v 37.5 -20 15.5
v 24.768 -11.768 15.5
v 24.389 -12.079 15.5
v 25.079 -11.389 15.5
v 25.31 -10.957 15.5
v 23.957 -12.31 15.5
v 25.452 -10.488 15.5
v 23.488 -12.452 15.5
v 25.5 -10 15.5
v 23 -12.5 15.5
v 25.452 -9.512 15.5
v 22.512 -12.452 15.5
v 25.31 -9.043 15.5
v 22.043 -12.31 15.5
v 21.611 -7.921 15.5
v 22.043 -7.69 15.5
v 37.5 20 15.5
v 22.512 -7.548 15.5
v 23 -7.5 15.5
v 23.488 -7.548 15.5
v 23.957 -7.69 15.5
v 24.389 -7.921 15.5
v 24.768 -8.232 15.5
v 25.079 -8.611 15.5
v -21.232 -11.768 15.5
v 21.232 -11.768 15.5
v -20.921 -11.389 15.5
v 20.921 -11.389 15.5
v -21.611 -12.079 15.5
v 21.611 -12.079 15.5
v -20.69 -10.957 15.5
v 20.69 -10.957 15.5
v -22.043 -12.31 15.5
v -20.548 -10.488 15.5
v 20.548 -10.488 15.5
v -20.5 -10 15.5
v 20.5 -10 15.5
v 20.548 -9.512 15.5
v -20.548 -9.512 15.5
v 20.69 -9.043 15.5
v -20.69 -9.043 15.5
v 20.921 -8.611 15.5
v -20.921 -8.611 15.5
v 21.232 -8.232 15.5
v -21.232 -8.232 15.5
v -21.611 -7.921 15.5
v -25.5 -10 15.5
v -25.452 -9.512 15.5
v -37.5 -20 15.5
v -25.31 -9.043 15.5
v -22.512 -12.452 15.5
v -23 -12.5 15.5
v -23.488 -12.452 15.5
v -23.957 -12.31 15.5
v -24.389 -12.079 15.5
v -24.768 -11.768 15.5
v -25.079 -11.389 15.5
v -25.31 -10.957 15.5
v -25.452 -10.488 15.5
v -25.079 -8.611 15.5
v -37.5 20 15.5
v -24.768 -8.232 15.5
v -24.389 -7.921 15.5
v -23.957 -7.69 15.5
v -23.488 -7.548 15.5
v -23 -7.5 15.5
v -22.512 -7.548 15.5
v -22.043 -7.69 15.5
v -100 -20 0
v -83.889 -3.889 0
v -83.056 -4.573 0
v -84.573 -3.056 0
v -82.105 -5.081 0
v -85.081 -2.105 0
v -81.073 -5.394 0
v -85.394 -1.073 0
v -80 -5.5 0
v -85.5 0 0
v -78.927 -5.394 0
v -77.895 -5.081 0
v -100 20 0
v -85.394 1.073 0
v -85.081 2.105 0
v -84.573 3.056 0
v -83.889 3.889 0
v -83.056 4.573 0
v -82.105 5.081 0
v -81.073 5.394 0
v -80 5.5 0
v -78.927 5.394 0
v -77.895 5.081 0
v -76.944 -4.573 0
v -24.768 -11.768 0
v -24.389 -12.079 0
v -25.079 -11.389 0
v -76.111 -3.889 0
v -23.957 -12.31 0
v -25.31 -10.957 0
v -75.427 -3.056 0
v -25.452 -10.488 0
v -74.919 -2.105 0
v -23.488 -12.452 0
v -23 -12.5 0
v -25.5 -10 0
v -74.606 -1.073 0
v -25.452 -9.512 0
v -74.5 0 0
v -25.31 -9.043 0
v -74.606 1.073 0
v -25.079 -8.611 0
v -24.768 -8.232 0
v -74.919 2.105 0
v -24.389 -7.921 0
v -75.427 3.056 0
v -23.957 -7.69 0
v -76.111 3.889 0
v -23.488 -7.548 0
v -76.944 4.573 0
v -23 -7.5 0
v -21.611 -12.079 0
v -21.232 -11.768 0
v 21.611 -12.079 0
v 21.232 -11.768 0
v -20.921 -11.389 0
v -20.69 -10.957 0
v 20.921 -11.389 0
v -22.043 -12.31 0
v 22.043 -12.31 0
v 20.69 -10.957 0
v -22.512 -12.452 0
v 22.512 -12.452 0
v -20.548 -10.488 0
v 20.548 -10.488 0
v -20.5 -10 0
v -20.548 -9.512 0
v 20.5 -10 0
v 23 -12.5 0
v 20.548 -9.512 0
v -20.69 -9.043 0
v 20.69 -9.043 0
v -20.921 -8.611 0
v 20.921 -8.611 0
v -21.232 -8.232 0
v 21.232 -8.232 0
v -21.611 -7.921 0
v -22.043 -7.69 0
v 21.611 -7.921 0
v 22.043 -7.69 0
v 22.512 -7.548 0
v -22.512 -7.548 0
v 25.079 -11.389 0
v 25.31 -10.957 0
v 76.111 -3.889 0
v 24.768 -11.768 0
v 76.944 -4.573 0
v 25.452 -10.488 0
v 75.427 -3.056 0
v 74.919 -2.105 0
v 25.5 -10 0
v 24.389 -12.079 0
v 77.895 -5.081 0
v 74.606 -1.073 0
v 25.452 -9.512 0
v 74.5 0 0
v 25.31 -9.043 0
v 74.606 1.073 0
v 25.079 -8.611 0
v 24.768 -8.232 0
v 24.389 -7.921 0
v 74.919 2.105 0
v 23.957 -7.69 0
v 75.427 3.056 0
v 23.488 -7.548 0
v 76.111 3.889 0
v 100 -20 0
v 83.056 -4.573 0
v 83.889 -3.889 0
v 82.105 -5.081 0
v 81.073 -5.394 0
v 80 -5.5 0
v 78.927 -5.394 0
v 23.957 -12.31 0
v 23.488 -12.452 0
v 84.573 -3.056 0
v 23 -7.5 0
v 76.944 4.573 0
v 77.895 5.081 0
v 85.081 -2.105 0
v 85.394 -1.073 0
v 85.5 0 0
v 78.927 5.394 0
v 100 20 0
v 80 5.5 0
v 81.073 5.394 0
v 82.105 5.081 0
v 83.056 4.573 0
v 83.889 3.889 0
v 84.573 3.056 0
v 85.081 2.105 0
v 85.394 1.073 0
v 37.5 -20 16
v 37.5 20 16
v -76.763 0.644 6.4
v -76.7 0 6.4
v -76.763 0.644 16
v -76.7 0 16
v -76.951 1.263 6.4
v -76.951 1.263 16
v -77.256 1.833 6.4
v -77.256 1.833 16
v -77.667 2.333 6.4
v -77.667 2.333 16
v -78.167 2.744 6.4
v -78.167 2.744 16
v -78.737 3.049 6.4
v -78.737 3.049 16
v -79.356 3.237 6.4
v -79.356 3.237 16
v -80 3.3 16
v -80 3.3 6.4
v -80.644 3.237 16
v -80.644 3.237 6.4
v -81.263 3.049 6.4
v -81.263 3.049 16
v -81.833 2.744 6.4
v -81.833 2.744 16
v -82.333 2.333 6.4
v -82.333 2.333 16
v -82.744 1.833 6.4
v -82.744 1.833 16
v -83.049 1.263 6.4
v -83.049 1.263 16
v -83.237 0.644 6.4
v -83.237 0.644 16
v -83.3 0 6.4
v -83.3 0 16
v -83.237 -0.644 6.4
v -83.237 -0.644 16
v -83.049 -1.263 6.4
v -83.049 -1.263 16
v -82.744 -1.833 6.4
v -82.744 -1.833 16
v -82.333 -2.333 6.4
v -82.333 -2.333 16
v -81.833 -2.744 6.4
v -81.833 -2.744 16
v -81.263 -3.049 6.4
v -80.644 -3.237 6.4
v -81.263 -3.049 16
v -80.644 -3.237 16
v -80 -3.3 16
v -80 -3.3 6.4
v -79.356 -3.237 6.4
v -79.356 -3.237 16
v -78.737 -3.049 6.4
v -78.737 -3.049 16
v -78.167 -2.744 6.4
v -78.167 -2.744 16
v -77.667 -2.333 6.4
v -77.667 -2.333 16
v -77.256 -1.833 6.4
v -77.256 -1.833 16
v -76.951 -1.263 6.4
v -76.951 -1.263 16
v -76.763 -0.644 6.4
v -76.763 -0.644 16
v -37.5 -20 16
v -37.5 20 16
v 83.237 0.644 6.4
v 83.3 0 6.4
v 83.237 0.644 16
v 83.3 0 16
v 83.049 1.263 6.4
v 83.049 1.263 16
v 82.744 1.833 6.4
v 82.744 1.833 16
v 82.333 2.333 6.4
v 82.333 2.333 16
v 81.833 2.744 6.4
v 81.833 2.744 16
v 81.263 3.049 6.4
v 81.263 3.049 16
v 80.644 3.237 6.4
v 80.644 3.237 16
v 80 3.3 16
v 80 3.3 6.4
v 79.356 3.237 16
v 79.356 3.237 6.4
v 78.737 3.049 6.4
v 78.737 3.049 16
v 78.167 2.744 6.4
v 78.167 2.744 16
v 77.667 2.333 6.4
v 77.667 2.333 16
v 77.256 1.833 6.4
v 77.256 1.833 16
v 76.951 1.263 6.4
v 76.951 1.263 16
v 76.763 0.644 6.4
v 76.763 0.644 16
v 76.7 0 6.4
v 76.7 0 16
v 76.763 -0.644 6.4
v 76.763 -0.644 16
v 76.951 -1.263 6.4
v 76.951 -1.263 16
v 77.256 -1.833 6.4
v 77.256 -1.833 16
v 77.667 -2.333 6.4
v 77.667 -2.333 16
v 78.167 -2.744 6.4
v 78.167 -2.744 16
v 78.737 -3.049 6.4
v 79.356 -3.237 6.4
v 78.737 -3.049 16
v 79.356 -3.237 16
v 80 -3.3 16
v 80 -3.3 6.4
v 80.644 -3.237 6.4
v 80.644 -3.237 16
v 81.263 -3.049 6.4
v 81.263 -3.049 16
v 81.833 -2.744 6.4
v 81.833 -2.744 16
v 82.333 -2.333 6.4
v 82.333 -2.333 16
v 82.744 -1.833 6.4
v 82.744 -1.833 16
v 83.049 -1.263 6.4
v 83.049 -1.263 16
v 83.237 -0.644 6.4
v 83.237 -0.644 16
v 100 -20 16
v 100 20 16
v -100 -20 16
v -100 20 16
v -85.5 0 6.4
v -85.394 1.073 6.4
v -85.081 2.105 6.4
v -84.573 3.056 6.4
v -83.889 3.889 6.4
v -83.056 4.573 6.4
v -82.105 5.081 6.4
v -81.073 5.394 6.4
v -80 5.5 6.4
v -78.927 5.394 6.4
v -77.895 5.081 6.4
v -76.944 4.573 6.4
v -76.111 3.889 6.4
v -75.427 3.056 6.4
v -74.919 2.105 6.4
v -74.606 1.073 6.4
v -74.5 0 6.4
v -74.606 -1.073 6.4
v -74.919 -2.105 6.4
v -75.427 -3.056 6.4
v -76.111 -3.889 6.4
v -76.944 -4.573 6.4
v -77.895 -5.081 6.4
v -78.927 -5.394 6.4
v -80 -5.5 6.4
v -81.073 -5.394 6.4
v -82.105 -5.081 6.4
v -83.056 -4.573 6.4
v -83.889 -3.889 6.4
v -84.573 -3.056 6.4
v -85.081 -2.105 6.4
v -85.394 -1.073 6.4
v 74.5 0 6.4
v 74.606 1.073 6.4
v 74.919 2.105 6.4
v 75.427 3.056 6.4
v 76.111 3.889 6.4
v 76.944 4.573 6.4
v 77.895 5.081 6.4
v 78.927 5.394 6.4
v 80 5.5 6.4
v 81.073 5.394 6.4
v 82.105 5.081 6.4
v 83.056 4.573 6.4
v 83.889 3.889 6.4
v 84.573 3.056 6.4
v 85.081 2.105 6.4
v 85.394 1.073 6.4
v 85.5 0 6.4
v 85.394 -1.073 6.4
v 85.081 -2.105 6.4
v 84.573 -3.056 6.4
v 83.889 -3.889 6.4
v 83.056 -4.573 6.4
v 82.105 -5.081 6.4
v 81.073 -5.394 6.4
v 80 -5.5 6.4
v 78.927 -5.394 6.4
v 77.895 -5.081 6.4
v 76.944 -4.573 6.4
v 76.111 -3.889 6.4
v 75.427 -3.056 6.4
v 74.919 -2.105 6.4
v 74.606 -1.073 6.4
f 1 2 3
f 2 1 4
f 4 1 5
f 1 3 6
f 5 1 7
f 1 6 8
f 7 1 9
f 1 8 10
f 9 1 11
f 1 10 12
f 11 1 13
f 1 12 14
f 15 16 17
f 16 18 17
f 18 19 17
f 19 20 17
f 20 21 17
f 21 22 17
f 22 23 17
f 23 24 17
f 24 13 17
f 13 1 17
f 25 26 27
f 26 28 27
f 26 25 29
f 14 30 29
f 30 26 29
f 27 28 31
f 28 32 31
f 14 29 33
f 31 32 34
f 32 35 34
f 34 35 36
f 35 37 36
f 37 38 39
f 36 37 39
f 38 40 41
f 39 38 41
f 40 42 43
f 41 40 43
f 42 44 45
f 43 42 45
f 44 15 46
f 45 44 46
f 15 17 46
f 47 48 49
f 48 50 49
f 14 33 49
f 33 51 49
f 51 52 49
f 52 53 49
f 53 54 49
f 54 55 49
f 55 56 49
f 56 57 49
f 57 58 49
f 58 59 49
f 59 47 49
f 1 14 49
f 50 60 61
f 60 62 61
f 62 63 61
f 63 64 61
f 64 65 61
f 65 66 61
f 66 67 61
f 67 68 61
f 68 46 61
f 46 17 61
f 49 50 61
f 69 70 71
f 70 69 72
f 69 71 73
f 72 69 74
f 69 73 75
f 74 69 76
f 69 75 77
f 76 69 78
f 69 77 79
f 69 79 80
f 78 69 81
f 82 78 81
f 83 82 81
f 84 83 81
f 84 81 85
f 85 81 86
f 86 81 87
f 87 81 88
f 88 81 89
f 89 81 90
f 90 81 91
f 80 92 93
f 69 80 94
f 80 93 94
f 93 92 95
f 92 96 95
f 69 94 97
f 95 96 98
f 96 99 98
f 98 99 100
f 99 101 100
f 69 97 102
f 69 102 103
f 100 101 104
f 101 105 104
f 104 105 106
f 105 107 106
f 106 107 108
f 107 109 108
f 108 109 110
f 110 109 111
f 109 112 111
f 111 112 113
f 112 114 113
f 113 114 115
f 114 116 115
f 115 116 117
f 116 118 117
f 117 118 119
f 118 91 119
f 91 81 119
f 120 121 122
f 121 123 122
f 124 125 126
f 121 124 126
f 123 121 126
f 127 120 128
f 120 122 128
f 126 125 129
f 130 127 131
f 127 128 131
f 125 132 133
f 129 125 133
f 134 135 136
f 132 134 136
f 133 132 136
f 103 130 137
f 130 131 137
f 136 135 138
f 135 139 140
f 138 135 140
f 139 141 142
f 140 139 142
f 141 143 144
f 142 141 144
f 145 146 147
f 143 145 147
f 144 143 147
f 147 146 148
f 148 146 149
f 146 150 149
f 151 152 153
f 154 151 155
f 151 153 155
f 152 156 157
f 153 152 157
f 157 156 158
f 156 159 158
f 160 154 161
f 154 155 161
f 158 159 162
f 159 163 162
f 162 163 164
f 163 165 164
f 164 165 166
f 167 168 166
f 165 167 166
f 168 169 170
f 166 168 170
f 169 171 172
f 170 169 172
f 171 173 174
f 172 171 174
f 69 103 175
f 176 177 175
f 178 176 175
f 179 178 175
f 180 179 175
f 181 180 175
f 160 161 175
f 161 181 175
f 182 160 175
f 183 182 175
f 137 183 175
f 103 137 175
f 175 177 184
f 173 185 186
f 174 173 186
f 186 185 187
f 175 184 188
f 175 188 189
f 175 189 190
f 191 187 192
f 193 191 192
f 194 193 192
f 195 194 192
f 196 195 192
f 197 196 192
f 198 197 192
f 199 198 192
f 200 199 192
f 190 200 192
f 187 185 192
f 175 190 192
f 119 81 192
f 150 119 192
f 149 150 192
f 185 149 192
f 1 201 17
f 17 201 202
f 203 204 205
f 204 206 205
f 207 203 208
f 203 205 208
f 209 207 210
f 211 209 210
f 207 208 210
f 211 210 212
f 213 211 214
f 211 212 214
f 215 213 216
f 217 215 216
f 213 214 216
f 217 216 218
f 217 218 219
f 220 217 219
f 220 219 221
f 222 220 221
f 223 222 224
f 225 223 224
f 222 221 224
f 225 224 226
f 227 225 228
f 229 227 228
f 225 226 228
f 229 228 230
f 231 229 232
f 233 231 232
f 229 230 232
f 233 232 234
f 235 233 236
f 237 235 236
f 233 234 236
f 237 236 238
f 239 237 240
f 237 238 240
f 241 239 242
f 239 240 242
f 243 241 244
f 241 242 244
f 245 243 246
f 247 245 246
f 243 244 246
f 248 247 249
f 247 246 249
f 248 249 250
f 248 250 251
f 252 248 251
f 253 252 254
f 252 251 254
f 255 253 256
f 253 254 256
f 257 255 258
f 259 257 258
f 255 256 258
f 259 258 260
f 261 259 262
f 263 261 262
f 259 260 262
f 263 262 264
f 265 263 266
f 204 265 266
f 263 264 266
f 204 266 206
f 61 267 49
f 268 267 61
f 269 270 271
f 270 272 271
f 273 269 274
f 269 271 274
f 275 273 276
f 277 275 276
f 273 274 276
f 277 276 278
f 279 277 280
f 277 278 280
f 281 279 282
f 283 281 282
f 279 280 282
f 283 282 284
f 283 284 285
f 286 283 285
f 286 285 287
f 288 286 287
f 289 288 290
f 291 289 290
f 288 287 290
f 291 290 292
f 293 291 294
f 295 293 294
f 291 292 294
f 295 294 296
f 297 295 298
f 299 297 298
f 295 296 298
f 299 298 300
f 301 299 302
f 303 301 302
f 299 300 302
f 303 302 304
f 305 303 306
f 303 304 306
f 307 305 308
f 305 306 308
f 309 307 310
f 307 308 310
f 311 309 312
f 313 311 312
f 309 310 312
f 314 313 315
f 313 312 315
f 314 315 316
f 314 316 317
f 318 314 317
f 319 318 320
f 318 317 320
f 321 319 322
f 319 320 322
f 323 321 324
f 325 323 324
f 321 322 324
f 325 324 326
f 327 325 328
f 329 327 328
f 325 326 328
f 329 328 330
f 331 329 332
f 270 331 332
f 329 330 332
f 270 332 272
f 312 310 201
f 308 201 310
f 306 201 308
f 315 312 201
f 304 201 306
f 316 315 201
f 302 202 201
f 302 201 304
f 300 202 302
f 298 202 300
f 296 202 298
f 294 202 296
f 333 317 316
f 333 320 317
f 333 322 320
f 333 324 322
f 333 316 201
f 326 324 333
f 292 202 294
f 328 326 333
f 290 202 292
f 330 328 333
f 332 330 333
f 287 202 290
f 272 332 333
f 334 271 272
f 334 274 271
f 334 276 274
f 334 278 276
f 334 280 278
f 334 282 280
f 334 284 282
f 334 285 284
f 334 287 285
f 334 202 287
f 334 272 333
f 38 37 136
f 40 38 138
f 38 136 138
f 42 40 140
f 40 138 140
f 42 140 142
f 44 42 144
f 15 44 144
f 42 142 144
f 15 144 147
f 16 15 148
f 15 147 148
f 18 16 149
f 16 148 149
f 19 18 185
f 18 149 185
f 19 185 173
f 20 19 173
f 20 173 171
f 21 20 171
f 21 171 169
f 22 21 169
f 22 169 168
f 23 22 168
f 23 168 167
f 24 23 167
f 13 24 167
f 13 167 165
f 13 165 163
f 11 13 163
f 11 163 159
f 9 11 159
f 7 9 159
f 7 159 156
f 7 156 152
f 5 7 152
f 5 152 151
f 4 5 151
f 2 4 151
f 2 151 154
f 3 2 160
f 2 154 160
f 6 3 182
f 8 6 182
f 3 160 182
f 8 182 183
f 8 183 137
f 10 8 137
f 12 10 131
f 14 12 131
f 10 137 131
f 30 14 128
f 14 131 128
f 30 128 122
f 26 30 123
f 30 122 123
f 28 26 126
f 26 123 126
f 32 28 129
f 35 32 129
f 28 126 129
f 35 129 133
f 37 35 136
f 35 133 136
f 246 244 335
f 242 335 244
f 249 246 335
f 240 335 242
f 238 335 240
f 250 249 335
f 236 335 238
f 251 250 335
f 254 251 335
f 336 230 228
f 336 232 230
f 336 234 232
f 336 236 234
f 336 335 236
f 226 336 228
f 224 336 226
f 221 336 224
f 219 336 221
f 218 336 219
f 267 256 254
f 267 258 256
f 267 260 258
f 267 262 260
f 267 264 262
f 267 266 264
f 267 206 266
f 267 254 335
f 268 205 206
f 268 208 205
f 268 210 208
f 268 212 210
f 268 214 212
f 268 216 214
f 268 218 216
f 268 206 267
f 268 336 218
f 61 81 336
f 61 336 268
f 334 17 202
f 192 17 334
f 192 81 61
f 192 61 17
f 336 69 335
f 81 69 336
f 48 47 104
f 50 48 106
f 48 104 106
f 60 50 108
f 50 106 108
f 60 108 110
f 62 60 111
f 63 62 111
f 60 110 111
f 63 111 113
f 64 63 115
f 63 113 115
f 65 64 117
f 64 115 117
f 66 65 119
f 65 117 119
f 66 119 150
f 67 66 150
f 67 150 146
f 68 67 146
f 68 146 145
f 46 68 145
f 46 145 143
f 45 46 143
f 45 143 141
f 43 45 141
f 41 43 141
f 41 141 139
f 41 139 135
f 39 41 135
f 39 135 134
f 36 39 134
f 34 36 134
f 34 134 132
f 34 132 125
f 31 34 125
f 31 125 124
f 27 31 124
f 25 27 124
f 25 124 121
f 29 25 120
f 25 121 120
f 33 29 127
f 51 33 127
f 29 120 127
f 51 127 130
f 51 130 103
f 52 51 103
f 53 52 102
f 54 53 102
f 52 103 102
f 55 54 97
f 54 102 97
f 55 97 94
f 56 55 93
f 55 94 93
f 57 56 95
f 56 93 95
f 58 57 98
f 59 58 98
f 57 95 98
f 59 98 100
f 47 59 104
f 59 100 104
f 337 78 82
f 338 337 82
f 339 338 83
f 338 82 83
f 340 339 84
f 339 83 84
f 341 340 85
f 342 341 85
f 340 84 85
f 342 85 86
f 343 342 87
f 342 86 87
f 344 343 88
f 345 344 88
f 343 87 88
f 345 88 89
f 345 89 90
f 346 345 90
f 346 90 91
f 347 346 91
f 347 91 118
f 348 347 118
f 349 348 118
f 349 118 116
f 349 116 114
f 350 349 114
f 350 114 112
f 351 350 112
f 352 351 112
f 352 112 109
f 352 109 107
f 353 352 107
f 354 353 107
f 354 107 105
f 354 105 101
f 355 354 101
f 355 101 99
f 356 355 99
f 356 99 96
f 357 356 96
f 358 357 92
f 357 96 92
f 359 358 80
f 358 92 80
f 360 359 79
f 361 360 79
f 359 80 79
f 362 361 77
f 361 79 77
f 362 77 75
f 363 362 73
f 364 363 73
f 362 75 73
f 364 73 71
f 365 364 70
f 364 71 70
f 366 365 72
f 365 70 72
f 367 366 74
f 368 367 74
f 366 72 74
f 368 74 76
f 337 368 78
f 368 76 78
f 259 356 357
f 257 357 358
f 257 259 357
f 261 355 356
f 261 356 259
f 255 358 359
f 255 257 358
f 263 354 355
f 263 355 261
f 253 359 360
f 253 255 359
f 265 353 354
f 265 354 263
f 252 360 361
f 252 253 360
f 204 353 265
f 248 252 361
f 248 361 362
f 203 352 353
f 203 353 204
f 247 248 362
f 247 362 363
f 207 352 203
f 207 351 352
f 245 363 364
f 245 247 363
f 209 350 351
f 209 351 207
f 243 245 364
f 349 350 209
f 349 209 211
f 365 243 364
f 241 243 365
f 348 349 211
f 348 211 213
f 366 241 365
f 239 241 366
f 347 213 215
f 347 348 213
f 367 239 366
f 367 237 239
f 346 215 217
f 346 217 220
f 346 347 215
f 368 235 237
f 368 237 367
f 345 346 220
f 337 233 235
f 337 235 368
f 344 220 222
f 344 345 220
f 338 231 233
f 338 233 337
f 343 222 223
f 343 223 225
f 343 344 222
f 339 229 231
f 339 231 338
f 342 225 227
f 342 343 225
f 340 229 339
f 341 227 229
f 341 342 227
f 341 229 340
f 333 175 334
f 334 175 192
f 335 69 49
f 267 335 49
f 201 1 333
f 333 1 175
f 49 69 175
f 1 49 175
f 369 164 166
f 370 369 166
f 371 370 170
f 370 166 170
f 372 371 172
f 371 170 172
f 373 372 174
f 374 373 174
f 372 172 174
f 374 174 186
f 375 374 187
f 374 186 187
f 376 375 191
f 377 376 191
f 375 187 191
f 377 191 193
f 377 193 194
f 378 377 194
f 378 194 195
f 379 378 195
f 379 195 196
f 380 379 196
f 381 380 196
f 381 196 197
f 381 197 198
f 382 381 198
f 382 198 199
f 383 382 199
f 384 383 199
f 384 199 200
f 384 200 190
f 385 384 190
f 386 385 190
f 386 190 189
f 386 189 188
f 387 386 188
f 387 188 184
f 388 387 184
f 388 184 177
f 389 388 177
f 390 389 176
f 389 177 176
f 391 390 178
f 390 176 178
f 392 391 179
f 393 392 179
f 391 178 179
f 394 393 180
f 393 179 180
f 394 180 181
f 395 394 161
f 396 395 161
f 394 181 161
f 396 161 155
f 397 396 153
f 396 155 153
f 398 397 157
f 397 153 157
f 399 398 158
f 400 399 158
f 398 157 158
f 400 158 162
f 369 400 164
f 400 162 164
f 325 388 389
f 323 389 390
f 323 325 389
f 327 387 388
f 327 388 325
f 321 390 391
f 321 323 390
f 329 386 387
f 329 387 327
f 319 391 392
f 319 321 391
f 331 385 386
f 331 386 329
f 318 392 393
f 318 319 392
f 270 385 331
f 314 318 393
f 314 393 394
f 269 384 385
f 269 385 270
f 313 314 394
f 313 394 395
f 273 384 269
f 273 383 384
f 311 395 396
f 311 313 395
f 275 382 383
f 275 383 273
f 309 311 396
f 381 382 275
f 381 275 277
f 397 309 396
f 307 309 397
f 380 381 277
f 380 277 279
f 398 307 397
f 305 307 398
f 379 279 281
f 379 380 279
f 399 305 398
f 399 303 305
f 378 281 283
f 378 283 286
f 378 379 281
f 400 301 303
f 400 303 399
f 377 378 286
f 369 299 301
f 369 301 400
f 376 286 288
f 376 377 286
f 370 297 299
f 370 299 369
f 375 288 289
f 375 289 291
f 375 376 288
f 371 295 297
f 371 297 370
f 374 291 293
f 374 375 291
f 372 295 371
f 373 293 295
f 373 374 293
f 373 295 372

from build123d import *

# Parameters (mm, degrees)
SKETCH1_W                                           = 200
SKETCH1_H                                           = 40
EXTRUDE1_DEPTH                                      = 16
SKETCH2_W                                           = 75
SKETCH2_H                                           = 40
EXTRUDE2_DEPTH                                      = 0.5
M6_TAPPED_HOLE1_D                                   = 5
CBORE_FOR_M6_HEX_SOCKET_HEAD_CAP_SCREW1_D           = 6.6
CBORE_FOR_M6_HEX_SOCKET_HEAD_CAP_SCREW1_CBORE_D     = 11
CBORE_FOR_M6_HEX_SOCKET_HEAD_CAP_SCREW1_CBORE_DEPTH = 6.4


with BuildPart() as part:
    # Sketch1 → Extrude1 (new body)
    with BuildSketch(Plane.XY):
        Rectangle(SKETCH1_W, SKETCH1_H)
    extrude(amount=EXTRUDE1_DEPTH)

    # Sketch2 → Extrude2 (cut)
    with BuildSketch(Plane(origin=(0, 0, 16), x_dir=(-1, 0, 0), z_dir=(0, 0, -1))):
        Rectangle(SKETCH2_W, SKETCH2_H)
    extrude(amount=EXTRUDE2_DEPTH, mode=Mode.SUBTRACT)

    # M6 Tapped Hole1 (through all)
    with Locations(Plane.XY.offset(15.5)):
        with Locations((-23, -10), (23, -10)):
            Hole(M6_TAPPED_HOLE1_D / 2)

    # CBORE for M6 Hex Socket Head Cap Screw1 (through all)
    with Locations(Plane(origin=(0, 0, 0), x_dir=(-1, 0, 0), z_dir=(0, 0, -1))):
        with Locations((-80, 0), (80, 0)):
            CounterBoreHole(CBORE_FOR_M6_HEX_SOCKET_HEAD_CAP_SCREW1_D / 2, CBORE_FOR_M6_HEX_SOCKET_HEAD_CAP_SCREW1_CBORE_D / 2, CBORE_FOR_M6_HEX_SOCKET_HEAD_CAP_SCREW1_CBORE_DEPTH)


solid = part.part
